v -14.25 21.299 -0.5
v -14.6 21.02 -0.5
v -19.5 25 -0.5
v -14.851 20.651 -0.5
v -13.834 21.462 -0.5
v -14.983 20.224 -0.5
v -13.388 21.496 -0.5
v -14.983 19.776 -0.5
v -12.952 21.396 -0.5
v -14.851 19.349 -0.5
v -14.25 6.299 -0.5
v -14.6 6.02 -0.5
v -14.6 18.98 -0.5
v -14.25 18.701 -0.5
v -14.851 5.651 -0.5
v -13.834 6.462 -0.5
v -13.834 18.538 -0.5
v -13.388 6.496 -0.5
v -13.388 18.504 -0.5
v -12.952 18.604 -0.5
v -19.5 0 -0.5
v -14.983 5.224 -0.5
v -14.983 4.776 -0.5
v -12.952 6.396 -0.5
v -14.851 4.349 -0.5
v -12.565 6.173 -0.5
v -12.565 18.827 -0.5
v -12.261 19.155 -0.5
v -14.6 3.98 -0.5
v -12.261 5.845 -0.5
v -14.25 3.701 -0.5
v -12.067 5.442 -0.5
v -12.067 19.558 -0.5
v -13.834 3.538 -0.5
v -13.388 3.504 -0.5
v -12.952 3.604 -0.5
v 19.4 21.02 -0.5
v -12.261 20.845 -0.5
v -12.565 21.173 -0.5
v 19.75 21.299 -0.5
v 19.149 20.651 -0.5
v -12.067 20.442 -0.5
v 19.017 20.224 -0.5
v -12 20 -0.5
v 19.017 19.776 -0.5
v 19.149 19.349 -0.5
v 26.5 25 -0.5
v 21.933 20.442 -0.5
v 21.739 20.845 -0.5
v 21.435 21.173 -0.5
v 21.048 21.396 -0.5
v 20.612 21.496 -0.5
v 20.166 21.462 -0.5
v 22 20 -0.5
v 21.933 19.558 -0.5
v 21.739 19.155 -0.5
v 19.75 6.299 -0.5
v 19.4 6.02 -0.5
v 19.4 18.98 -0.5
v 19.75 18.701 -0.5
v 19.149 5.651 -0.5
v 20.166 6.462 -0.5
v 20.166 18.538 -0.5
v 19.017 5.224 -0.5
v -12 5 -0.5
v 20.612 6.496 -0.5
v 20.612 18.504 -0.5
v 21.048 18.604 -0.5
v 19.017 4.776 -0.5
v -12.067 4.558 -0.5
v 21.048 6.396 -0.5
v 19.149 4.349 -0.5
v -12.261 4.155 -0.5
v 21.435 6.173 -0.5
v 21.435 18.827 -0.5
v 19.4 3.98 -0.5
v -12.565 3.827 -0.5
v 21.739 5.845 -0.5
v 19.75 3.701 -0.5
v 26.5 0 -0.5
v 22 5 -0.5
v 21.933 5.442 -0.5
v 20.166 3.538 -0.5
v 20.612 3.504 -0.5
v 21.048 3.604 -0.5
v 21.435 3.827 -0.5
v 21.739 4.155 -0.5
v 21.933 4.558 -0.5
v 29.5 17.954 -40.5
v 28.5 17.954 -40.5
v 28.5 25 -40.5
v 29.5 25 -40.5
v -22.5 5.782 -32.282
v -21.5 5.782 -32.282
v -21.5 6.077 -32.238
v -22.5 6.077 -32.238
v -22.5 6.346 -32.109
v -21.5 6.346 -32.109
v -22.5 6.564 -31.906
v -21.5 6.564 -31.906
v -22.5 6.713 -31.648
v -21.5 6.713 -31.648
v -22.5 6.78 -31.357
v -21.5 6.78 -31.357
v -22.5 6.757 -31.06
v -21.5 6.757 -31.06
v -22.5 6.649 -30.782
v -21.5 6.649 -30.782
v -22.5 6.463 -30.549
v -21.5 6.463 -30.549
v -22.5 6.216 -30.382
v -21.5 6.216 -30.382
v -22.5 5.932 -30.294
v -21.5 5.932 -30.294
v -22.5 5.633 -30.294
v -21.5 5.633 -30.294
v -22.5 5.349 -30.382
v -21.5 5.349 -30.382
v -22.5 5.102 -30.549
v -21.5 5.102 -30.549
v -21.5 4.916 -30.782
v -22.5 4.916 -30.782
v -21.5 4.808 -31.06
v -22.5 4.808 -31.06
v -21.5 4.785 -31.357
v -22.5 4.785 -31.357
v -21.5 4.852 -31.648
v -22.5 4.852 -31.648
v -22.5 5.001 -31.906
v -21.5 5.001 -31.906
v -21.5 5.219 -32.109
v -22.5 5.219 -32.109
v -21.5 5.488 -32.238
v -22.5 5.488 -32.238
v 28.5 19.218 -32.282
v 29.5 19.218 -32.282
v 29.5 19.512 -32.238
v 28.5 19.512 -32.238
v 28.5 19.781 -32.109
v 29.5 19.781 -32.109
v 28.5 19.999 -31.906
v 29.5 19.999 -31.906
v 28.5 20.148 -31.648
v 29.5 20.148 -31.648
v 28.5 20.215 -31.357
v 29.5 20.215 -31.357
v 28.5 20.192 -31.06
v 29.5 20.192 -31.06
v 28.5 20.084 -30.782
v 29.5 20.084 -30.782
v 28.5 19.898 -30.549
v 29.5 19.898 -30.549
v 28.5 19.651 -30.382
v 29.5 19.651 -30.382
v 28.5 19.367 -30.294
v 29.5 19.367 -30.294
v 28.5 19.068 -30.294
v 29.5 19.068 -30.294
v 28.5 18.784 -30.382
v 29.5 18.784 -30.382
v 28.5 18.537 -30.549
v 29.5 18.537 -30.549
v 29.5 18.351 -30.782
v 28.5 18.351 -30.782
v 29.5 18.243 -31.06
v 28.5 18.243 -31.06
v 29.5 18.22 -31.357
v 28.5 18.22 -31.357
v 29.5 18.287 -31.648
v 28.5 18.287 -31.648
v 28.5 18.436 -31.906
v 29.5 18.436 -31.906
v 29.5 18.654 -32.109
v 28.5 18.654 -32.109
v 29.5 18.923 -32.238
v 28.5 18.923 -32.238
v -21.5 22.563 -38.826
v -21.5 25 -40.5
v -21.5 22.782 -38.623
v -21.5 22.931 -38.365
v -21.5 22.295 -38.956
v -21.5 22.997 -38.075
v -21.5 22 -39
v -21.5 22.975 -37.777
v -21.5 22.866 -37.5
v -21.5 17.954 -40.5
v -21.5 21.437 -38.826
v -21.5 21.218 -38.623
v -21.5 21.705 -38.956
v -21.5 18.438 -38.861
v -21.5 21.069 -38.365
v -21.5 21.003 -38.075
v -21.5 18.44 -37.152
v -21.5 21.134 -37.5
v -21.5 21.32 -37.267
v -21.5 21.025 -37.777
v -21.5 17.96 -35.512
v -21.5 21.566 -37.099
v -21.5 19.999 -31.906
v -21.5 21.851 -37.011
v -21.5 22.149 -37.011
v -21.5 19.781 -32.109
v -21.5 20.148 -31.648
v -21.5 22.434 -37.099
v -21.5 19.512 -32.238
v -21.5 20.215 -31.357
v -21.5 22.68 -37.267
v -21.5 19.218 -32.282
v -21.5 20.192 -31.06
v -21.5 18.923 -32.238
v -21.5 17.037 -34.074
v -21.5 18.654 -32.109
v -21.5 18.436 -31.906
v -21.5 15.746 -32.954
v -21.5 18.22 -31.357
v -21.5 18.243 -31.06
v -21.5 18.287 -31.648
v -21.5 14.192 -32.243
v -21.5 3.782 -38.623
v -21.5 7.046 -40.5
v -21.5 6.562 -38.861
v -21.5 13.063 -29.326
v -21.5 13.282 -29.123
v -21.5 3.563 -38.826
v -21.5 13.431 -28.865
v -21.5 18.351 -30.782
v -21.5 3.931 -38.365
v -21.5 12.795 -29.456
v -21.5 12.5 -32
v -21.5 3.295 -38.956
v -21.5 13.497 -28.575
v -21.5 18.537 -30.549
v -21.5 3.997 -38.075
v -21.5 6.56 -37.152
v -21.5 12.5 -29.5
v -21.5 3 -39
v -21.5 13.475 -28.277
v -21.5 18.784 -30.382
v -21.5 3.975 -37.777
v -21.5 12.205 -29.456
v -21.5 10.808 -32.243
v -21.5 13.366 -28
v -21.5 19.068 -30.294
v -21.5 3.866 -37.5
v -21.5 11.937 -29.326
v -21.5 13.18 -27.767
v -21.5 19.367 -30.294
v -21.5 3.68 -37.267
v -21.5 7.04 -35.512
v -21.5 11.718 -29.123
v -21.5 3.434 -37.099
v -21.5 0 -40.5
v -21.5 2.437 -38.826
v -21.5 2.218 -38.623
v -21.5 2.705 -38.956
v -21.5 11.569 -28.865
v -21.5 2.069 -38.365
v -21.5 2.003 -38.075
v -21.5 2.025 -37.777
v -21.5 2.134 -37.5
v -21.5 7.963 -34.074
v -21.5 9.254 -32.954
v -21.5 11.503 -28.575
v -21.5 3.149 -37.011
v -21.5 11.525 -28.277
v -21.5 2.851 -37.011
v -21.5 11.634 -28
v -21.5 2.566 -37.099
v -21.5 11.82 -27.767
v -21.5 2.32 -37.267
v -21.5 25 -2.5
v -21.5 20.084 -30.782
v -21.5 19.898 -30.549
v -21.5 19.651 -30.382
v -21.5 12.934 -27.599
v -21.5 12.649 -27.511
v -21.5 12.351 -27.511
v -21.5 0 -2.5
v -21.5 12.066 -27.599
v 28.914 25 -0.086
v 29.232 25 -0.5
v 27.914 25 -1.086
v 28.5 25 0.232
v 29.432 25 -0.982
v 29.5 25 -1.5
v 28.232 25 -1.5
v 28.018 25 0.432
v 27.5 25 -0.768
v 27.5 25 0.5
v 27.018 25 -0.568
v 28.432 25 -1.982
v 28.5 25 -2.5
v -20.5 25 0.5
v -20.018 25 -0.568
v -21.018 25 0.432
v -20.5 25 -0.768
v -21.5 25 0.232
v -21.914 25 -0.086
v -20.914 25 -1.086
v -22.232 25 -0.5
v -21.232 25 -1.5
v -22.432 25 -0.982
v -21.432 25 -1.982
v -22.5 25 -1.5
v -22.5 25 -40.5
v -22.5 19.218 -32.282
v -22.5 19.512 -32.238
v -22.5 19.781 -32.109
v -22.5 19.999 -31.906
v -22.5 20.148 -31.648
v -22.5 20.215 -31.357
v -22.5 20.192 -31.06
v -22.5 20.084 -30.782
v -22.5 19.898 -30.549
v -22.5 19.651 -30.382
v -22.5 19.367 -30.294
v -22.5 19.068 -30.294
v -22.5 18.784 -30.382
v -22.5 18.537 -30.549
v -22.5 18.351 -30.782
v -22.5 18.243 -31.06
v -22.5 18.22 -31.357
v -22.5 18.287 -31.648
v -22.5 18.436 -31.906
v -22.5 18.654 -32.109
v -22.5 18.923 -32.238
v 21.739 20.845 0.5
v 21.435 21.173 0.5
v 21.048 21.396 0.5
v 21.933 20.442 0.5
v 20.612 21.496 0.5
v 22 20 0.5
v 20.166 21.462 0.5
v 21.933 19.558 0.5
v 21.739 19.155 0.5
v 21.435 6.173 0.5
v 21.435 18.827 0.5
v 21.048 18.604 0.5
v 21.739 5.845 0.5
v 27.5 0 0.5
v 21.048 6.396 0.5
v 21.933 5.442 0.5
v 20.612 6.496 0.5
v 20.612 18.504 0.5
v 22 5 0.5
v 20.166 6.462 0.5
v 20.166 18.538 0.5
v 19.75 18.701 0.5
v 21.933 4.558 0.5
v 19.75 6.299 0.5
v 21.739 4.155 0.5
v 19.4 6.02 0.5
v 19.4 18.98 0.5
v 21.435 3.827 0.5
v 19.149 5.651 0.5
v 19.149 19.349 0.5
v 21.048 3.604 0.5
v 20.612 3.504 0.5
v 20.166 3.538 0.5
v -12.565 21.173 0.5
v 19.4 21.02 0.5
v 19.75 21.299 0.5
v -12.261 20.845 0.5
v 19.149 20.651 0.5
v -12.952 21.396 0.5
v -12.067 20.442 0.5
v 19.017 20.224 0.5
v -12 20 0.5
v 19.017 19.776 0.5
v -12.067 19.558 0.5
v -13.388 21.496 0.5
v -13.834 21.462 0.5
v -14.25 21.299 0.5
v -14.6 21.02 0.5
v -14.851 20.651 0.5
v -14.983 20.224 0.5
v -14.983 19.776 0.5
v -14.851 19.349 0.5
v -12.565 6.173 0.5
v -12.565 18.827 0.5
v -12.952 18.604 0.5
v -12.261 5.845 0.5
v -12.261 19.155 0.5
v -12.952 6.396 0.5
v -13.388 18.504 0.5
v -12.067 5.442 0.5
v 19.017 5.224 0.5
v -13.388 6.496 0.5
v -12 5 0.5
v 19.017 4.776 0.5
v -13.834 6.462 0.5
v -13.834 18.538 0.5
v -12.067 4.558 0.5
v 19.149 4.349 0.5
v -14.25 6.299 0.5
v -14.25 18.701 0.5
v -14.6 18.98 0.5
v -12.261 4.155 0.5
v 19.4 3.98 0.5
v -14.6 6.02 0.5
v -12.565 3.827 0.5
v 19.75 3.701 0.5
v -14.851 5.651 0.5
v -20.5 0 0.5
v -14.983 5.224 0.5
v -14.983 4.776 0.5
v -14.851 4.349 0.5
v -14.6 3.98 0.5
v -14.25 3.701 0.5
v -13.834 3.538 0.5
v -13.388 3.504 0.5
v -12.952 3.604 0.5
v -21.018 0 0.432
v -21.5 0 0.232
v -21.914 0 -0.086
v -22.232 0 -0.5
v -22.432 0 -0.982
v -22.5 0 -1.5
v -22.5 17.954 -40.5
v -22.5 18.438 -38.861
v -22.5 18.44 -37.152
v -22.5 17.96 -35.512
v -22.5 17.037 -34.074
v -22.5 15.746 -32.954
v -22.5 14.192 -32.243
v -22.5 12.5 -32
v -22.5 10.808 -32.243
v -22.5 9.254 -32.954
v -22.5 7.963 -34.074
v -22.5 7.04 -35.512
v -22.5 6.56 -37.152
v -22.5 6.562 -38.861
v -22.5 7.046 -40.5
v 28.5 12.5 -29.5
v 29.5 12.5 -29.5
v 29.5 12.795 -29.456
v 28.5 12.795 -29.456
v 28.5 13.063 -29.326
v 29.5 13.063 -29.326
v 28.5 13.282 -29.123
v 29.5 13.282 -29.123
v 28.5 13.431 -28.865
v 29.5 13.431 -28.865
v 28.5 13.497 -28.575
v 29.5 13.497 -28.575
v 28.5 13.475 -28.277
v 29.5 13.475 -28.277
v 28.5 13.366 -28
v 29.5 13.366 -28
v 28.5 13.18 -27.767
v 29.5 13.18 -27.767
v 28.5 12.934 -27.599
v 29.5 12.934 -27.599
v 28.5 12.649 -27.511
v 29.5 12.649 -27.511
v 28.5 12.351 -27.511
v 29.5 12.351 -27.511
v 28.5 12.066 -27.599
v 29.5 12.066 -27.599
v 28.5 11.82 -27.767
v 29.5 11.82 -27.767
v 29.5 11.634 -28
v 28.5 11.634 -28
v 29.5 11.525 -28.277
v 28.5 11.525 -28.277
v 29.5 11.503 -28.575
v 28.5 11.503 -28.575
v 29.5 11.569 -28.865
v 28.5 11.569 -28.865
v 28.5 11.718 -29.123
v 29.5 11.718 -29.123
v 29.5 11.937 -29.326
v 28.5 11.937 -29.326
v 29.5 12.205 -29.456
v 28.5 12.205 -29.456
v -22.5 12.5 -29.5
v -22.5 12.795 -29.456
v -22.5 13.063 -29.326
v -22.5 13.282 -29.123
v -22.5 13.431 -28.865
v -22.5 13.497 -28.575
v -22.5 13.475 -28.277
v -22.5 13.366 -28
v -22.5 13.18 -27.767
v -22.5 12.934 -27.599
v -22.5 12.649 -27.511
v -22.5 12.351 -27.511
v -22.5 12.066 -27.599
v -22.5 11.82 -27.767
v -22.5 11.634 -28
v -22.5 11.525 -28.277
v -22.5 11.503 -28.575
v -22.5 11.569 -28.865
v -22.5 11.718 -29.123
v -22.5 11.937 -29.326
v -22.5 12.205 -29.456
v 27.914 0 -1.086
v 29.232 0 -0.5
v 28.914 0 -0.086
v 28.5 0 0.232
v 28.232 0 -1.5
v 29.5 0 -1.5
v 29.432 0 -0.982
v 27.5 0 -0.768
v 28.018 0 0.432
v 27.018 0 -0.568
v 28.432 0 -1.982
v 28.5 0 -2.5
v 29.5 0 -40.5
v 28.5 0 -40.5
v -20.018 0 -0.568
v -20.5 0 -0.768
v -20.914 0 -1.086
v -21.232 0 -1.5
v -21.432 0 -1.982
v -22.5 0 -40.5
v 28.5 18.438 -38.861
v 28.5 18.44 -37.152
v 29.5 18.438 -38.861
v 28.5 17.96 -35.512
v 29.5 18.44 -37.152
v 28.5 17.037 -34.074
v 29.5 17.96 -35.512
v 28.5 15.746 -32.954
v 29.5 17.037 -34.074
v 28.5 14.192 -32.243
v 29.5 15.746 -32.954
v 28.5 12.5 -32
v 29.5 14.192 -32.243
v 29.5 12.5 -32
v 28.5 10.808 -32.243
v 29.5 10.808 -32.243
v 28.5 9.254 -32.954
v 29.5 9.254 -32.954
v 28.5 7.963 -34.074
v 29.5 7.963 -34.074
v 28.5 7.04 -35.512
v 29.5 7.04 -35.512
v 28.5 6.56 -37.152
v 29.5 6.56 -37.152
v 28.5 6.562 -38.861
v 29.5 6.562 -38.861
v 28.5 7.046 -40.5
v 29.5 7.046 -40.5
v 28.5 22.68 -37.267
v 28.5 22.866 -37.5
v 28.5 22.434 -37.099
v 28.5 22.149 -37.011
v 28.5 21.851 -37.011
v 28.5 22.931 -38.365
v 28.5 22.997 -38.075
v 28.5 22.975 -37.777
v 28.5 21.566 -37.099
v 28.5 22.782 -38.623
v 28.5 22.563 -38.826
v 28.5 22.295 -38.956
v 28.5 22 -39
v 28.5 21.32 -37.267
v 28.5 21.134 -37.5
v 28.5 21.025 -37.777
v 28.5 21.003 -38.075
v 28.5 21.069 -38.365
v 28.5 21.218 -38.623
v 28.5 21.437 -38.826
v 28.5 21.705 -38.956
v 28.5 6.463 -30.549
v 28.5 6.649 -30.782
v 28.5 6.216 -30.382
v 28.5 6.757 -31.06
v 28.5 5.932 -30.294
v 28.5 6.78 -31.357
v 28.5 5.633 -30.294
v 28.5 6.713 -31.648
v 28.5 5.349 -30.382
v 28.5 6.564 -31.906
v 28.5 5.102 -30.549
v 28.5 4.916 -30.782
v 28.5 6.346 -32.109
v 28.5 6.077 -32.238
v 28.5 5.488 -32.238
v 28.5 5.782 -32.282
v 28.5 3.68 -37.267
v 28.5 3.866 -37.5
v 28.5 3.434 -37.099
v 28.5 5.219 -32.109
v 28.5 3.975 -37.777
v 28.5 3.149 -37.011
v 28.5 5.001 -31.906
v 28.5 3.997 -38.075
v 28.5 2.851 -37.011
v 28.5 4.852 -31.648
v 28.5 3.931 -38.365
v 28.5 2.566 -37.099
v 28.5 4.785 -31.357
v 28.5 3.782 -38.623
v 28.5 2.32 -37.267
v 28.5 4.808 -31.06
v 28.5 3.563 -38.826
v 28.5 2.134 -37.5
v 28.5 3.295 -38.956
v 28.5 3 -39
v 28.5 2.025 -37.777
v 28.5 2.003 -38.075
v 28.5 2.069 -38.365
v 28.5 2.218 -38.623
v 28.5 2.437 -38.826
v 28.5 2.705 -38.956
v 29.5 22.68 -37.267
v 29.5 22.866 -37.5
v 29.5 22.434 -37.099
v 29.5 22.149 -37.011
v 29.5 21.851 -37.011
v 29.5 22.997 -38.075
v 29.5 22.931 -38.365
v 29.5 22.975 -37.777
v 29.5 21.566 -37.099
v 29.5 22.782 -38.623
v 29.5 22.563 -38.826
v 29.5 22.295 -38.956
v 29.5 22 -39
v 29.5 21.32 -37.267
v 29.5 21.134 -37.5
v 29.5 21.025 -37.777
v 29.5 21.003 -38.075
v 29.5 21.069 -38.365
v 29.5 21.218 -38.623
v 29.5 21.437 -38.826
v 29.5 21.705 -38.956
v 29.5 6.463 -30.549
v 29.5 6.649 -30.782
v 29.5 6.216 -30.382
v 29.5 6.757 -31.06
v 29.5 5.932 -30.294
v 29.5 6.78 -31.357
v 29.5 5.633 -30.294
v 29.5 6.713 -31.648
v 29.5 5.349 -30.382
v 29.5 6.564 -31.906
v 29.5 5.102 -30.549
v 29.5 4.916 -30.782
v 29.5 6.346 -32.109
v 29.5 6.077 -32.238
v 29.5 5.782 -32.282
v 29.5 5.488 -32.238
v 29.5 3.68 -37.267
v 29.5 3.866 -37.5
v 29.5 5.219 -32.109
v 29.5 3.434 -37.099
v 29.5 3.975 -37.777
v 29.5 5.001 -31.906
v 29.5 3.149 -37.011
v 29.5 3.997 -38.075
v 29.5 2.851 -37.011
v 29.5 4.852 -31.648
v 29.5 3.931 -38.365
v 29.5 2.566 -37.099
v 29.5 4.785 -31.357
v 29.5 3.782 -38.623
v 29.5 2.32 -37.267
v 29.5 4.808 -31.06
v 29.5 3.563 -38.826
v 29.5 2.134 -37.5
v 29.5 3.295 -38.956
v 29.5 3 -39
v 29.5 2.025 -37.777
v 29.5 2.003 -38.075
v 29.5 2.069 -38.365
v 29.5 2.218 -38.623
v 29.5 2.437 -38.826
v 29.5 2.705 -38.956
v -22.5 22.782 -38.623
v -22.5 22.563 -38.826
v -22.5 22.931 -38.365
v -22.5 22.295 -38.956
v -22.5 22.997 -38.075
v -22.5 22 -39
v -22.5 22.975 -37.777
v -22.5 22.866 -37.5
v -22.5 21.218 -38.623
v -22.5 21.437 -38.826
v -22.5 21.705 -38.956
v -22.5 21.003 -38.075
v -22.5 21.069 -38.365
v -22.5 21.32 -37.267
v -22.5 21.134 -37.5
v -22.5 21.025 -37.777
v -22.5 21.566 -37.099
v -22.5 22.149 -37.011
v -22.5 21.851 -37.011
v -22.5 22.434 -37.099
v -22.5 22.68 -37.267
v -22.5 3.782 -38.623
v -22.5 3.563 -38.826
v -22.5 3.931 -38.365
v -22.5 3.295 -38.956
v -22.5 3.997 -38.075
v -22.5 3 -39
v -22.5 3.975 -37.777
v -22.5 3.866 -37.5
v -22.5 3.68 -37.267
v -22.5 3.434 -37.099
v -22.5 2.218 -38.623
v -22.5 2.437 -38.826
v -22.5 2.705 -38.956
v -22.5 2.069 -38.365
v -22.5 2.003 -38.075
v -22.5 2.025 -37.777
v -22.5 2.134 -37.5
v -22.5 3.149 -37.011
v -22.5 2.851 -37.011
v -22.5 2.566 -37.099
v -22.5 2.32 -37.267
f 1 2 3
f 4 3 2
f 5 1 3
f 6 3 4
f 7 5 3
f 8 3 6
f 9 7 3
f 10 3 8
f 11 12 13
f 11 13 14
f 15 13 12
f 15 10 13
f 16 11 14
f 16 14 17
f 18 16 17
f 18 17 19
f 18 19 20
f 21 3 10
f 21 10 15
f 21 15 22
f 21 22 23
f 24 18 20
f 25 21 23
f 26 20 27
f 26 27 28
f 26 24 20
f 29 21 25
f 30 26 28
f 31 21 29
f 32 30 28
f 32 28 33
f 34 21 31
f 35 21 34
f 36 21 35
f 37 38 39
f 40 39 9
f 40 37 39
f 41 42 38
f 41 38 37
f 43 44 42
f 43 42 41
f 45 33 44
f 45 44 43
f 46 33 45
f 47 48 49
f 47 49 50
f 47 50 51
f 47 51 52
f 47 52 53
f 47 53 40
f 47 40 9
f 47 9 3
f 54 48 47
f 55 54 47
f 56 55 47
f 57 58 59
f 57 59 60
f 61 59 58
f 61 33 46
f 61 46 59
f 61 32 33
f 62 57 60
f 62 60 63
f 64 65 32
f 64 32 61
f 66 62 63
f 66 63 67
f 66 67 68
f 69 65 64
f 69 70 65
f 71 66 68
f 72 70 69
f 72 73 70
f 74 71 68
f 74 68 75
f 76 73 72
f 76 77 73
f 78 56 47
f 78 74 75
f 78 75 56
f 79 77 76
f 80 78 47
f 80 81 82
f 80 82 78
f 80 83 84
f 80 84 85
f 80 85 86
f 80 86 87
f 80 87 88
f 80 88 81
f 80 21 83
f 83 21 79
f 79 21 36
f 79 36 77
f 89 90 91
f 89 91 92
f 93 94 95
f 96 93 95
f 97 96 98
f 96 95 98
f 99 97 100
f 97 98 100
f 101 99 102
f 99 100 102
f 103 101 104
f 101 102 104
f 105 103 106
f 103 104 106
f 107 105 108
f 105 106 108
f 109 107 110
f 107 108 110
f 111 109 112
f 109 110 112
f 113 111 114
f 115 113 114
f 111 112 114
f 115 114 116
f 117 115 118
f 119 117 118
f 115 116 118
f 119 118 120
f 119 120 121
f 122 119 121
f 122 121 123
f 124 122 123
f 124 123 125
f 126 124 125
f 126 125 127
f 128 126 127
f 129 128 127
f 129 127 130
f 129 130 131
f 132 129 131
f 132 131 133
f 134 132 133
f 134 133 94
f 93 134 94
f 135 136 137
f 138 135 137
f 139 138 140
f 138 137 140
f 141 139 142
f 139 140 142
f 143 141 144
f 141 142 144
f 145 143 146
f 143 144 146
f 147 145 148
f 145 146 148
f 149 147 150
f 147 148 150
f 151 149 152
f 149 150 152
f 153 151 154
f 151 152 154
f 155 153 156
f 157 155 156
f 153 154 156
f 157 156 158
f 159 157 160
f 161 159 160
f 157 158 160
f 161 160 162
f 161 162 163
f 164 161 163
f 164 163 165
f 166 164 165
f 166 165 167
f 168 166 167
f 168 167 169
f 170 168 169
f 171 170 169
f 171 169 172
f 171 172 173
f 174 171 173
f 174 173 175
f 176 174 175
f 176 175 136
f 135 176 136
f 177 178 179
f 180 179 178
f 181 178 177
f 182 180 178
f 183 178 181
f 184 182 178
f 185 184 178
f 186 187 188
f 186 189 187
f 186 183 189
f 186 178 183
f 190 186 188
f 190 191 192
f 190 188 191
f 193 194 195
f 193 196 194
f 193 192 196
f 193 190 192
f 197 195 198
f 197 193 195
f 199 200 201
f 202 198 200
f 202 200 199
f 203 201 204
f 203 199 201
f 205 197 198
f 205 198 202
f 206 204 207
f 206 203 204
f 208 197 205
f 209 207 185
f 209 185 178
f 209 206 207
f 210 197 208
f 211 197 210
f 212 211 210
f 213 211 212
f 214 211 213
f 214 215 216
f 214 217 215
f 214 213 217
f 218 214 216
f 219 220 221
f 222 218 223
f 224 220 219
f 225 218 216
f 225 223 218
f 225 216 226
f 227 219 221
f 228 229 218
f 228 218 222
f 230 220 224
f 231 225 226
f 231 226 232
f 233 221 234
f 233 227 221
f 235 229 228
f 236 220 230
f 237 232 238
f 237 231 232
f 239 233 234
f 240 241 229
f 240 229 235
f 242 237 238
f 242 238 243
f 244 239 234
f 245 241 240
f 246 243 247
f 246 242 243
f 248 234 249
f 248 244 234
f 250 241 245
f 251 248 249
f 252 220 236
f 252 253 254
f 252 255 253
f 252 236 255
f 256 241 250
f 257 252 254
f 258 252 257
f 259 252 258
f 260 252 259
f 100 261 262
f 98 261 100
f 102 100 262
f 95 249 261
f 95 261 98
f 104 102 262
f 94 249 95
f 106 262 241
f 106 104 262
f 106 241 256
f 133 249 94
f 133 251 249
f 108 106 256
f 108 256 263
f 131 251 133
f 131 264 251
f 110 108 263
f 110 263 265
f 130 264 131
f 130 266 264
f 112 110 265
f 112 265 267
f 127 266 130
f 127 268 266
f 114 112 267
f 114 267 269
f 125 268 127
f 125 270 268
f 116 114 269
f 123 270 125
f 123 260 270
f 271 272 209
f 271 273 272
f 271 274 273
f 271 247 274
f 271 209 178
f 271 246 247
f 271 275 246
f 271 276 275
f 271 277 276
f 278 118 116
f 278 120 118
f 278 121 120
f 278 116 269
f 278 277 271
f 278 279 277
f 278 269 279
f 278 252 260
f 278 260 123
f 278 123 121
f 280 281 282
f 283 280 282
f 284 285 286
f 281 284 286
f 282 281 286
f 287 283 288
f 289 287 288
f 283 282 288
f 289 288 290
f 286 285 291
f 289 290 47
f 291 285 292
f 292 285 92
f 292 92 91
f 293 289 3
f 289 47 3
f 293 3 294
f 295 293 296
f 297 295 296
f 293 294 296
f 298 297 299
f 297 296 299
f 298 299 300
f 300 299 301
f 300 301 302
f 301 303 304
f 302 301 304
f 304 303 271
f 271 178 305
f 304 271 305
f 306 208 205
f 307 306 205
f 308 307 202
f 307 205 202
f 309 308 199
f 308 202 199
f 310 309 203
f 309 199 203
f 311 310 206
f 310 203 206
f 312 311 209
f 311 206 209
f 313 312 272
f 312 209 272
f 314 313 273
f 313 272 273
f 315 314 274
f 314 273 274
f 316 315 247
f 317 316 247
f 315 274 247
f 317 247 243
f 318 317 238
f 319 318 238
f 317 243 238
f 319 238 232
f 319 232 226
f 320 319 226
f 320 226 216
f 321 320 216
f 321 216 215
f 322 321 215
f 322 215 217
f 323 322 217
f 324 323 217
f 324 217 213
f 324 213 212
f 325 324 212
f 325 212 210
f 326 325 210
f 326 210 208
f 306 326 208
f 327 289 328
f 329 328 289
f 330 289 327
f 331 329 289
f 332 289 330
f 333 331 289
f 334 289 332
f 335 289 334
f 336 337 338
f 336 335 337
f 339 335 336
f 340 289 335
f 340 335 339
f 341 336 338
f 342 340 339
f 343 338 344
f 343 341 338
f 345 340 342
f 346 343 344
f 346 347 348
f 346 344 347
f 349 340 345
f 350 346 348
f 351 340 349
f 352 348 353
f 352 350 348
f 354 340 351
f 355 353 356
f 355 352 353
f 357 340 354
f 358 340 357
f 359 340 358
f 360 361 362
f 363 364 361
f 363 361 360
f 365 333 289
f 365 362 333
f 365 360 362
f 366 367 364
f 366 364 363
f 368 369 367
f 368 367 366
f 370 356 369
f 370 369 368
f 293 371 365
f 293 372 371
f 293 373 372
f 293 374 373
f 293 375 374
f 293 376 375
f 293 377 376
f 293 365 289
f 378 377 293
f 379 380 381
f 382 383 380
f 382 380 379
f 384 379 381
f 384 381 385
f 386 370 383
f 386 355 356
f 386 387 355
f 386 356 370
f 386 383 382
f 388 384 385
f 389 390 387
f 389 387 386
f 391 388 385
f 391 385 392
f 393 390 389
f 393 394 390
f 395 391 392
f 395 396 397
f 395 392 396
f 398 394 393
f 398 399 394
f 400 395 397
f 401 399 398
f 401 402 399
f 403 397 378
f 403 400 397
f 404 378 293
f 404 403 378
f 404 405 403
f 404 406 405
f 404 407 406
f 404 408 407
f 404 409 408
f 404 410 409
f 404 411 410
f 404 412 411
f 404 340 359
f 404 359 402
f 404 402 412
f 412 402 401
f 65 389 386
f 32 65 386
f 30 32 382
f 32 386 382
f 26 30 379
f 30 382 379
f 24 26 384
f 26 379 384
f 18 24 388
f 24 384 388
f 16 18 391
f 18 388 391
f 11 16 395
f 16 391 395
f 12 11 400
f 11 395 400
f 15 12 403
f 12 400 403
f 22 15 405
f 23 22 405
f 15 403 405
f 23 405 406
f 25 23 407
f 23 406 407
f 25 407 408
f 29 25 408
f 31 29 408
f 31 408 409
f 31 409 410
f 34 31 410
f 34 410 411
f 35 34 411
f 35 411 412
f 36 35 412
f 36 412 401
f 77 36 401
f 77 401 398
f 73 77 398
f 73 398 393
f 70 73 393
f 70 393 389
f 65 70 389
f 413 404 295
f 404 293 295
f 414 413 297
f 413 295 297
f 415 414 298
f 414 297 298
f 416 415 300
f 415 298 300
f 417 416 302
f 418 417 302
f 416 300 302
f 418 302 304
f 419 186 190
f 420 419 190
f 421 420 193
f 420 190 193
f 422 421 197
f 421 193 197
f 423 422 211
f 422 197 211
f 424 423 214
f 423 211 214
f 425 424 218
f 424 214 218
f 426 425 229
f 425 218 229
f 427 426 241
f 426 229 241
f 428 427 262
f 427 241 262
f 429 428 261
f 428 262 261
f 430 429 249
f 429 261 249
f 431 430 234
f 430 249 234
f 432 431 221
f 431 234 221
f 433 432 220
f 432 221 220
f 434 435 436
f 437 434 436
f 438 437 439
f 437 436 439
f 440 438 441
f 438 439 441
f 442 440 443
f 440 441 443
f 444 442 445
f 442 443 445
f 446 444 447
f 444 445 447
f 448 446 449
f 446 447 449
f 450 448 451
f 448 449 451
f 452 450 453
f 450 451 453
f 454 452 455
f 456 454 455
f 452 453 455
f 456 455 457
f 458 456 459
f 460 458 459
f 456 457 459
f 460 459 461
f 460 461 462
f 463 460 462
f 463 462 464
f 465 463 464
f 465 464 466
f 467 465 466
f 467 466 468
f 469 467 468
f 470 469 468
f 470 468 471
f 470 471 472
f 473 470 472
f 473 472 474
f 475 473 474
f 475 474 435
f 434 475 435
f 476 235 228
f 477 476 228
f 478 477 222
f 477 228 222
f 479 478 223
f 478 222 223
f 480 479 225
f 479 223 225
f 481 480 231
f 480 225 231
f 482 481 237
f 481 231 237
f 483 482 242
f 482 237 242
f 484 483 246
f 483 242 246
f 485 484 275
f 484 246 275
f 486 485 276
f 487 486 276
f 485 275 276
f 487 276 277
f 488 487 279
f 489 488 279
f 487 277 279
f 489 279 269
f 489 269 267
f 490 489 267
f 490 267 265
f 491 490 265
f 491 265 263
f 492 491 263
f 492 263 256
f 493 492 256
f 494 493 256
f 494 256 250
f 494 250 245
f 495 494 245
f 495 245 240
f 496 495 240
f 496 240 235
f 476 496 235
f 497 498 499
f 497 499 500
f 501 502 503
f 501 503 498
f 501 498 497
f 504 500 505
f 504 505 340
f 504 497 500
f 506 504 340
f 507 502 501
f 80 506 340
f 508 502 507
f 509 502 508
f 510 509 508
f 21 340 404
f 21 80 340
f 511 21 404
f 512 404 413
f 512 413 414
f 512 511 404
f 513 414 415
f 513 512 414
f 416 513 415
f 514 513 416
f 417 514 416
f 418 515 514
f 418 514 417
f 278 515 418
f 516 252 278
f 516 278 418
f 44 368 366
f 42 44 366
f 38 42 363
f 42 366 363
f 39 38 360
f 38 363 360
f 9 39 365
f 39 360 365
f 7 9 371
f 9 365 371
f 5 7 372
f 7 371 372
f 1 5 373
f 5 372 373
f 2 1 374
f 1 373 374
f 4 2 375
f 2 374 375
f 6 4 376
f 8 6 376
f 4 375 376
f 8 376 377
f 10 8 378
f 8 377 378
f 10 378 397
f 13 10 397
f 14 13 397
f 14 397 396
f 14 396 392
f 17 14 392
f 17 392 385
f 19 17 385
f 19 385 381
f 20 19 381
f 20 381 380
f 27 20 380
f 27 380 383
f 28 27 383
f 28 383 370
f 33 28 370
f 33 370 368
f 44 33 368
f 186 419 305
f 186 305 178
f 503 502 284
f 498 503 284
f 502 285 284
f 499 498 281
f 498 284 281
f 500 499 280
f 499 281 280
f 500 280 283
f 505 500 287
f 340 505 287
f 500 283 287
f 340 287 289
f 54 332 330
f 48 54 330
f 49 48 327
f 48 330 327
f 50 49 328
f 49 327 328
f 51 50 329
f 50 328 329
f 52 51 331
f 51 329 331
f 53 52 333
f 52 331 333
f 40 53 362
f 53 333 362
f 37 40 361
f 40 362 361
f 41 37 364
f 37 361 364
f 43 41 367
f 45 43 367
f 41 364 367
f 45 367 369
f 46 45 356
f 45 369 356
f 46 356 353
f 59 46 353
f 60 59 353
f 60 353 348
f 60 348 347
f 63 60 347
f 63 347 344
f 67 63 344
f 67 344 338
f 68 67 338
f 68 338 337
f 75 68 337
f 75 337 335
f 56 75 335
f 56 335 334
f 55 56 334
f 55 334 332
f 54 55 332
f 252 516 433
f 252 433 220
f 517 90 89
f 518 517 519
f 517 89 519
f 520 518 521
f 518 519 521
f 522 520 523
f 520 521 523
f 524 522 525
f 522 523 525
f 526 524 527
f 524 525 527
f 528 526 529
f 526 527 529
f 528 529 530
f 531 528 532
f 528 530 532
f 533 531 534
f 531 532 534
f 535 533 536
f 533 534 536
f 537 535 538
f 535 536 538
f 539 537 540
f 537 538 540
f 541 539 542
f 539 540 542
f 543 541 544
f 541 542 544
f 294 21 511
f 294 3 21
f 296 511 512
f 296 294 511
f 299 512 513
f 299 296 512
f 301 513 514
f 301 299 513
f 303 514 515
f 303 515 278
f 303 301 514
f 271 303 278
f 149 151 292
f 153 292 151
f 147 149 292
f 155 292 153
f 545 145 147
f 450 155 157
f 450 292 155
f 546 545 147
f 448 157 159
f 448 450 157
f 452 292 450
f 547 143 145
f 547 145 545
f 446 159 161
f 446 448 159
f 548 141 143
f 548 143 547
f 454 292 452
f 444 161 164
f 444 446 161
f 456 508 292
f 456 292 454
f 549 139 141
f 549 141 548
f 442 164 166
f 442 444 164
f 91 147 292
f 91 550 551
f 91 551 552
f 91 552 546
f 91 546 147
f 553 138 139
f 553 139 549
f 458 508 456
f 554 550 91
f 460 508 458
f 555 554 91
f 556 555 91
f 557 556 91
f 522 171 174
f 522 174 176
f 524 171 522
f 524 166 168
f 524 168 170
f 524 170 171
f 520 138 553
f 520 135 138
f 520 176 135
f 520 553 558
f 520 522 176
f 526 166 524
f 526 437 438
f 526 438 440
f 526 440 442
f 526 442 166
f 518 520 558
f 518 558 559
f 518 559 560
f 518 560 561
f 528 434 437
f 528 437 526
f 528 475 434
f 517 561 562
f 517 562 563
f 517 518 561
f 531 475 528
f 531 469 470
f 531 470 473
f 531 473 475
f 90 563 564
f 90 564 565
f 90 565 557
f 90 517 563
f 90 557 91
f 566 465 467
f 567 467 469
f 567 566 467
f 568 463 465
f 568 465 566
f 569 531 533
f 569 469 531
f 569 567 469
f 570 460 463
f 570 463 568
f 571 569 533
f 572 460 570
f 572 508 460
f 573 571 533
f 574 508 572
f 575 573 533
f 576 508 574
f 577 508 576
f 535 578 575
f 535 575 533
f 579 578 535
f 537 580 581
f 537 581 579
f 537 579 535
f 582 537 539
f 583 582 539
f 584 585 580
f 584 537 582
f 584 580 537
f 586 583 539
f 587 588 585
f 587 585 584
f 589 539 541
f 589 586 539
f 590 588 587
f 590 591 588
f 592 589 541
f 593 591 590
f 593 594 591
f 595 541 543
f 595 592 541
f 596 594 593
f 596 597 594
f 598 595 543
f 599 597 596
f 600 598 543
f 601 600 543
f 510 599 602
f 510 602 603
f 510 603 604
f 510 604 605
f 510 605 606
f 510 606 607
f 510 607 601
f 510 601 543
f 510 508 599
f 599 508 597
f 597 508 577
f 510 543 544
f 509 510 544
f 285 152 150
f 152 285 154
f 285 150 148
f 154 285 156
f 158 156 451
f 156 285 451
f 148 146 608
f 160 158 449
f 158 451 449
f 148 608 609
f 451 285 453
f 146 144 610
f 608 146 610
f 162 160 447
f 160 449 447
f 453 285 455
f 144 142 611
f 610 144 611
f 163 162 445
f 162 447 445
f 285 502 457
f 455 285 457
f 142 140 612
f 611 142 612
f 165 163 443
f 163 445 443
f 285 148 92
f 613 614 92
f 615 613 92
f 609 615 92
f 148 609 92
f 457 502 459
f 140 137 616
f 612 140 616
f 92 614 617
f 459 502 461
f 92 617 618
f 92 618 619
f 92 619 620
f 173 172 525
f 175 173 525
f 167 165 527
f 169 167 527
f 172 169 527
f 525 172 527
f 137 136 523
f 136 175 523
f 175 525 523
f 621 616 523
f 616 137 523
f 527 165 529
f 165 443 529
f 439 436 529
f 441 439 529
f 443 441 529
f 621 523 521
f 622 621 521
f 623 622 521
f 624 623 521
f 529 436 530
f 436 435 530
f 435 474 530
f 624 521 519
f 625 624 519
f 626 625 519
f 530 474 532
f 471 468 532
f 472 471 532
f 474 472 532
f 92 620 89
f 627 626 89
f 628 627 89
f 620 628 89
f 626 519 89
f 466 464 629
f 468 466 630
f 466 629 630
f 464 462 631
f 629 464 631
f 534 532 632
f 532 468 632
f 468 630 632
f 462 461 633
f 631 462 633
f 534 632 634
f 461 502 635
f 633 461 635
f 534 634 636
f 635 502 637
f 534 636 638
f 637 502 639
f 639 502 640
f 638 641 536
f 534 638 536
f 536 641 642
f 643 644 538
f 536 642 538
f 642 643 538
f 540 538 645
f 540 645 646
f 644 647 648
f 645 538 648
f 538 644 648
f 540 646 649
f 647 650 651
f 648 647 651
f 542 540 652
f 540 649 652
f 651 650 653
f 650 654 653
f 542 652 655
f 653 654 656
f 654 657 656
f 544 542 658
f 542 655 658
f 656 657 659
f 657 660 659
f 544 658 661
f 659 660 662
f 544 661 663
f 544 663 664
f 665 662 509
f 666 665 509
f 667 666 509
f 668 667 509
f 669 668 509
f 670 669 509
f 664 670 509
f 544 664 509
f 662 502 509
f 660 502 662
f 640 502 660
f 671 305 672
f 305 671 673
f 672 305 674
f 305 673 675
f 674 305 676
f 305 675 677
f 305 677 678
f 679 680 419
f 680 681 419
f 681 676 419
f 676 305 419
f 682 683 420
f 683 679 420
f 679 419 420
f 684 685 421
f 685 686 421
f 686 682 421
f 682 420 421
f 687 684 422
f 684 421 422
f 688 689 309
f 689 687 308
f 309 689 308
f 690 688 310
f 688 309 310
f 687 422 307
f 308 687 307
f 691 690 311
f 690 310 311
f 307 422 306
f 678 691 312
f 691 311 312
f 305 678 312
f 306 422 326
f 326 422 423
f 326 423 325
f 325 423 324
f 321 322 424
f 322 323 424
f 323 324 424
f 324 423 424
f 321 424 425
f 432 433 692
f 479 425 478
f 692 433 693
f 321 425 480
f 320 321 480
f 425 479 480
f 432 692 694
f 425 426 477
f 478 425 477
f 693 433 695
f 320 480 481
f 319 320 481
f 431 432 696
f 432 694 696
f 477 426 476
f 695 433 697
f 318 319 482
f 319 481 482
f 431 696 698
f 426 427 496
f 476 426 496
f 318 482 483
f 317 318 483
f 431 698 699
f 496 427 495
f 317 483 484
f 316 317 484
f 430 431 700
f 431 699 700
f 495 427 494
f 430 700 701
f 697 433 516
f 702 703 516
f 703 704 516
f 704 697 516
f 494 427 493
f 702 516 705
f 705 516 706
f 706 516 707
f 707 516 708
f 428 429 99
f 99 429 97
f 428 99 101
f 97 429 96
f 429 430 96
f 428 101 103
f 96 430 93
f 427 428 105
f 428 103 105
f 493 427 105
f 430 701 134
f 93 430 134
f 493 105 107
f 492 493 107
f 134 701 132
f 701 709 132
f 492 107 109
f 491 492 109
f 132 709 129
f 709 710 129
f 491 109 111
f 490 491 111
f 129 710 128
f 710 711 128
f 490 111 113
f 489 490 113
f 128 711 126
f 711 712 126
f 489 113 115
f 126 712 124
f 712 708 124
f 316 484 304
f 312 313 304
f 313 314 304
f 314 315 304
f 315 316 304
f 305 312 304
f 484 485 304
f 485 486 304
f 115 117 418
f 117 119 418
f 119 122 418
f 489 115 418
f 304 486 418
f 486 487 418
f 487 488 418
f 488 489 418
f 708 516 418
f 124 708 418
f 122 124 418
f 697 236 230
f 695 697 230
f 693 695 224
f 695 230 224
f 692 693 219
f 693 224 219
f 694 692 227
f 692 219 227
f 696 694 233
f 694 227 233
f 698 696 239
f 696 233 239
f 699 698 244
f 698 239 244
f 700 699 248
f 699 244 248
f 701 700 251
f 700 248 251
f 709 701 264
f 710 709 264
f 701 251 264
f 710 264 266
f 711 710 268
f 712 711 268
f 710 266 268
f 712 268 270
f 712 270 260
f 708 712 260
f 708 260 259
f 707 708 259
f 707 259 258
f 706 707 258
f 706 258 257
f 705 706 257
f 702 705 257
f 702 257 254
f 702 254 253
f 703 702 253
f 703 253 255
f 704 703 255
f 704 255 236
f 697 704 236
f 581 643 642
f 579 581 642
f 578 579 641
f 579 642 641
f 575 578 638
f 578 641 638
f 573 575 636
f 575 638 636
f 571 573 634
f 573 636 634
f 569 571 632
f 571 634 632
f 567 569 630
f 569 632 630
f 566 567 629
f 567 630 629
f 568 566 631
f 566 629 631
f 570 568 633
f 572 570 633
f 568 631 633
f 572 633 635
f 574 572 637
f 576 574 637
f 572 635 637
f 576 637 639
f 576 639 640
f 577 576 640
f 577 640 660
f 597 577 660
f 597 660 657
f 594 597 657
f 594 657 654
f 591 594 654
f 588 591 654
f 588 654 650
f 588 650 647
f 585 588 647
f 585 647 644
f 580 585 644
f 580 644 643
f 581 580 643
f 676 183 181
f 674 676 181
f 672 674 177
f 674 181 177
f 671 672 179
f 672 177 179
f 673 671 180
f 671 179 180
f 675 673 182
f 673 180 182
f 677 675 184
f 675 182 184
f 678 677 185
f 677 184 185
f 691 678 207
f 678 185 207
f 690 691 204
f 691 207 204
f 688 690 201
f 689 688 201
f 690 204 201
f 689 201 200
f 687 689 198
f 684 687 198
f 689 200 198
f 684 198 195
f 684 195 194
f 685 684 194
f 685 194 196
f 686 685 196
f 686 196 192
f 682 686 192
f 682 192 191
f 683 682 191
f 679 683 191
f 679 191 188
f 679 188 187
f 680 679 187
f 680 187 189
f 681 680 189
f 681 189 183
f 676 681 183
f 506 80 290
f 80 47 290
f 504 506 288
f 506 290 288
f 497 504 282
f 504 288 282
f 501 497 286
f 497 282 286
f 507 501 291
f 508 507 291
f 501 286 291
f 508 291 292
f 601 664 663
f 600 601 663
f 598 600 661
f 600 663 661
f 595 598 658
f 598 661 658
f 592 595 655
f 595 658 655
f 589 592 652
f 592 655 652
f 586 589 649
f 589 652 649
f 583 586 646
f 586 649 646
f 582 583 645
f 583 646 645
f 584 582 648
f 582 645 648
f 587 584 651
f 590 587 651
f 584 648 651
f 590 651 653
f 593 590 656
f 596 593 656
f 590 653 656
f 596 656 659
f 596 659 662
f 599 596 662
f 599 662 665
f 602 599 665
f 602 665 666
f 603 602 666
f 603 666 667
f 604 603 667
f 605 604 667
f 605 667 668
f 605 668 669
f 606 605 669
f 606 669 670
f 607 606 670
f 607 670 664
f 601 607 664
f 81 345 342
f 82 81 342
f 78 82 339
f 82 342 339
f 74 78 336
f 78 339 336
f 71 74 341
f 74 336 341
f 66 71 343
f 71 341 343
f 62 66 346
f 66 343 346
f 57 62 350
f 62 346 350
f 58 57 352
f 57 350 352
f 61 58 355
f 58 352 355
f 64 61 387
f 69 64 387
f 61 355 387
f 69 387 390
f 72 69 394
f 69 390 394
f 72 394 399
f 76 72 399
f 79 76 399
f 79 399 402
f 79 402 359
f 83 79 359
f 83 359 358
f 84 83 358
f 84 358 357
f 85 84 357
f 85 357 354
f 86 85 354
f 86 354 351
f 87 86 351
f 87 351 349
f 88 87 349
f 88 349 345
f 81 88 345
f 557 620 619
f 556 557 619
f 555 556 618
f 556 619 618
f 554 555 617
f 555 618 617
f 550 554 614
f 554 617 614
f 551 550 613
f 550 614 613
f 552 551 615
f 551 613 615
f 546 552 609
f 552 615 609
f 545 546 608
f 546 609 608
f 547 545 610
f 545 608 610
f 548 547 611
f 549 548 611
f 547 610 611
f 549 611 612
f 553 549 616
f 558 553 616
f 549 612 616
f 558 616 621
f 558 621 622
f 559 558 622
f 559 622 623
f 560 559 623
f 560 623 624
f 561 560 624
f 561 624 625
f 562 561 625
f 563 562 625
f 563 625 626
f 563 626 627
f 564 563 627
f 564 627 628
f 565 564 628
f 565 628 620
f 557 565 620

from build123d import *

# Parameters (mm, degrees)
BOSS_EXTRUDE1_DEPTH = 25
SKETCH2_R           = 1
SKETCH2_R_2         = 6
CUT_EXTRUDE1_DEPTH  = 53
FILLET2_R           = 2
SKETCH3_R           = 1.5
CUT_EXTRUDE2_DEPTH  = 42


with BuildPart() as part:
    # Sketch1 → Boss-Extrude1 (new body)
    with BuildSketch(Plane(origin=(0, 0, 0), x_dir=(1, 0, 0), z_dir=(0, 1, 0))):
        Polygon((-21.5, 0.5), (28.5, 0.5), (28.5, 40.5), (29.5, 40.5), (29.5, 0.5), (29.5, -0.5), (-22.5, -0.5), (-22.5, 0.5), (-22.5, 40.5), (-21.5, 40.5), align=None)
    extrude(amount=BOSS_EXTRUDE1_DEPTH)

    # Sketch2 → Cut-Extrude1 (cut, through all)
    with BuildSketch(Plane(origin=(29.5, 0, 0), x_dir=(0, 0, -1), z_dir=(1, 0, 0))):
        with Locations((28.5, 12.5)):
            Circle(SKETCH2_R)
        with Locations((38, 12.5)):
            Circle(SKETCH2_R_2)
        with Locations((31.282485579, 19.217514421)):
            Circle(SKETCH2_R)
        with Locations((38, 22)):
            Circle(SKETCH2_R)
        with Locations((38, 3)):
            Circle(SKETCH2_R)
        with Locations((31.282485579, 5.782485579)):
            Circle(SKETCH2_R)
    extrude(amount=-CUT_EXTRUDE1_DEPTH, mode=Mode.SUBTRACT)

    # Fillet2
    fillet2_edges = [part.edges().sort_by_distance(p)[0] for p in [
        (29.5, 12.5, 0.5),
        (-22.5, 12.5, 0.5),
        (-21.5, 12.5, -0.5),
        (28.5, 12.5, -0.5),
    ]]
    fillet(fillet2_edges, radius=FILLET2_R)

    # Sketch3 → Cut-Extrude2 (cut, through all)
    with BuildSketch(Plane.XY.offset(0.5)):
        with Locations((-13.5, 20)):
            Circle(SKETCH3_R)
        with Locations((20.5, 20)):
            Circle(SKETCH3_R)
        with Locations((-13.5, 5)):
            Circle(SKETCH3_R)
        with Locations((20.5, 5)):
            Circle(SKETCH3_R)
    extrude(amount=-CUT_EXTRUDE2_DEPTH, mode=Mode.SUBTRACT)


solid = part.part
